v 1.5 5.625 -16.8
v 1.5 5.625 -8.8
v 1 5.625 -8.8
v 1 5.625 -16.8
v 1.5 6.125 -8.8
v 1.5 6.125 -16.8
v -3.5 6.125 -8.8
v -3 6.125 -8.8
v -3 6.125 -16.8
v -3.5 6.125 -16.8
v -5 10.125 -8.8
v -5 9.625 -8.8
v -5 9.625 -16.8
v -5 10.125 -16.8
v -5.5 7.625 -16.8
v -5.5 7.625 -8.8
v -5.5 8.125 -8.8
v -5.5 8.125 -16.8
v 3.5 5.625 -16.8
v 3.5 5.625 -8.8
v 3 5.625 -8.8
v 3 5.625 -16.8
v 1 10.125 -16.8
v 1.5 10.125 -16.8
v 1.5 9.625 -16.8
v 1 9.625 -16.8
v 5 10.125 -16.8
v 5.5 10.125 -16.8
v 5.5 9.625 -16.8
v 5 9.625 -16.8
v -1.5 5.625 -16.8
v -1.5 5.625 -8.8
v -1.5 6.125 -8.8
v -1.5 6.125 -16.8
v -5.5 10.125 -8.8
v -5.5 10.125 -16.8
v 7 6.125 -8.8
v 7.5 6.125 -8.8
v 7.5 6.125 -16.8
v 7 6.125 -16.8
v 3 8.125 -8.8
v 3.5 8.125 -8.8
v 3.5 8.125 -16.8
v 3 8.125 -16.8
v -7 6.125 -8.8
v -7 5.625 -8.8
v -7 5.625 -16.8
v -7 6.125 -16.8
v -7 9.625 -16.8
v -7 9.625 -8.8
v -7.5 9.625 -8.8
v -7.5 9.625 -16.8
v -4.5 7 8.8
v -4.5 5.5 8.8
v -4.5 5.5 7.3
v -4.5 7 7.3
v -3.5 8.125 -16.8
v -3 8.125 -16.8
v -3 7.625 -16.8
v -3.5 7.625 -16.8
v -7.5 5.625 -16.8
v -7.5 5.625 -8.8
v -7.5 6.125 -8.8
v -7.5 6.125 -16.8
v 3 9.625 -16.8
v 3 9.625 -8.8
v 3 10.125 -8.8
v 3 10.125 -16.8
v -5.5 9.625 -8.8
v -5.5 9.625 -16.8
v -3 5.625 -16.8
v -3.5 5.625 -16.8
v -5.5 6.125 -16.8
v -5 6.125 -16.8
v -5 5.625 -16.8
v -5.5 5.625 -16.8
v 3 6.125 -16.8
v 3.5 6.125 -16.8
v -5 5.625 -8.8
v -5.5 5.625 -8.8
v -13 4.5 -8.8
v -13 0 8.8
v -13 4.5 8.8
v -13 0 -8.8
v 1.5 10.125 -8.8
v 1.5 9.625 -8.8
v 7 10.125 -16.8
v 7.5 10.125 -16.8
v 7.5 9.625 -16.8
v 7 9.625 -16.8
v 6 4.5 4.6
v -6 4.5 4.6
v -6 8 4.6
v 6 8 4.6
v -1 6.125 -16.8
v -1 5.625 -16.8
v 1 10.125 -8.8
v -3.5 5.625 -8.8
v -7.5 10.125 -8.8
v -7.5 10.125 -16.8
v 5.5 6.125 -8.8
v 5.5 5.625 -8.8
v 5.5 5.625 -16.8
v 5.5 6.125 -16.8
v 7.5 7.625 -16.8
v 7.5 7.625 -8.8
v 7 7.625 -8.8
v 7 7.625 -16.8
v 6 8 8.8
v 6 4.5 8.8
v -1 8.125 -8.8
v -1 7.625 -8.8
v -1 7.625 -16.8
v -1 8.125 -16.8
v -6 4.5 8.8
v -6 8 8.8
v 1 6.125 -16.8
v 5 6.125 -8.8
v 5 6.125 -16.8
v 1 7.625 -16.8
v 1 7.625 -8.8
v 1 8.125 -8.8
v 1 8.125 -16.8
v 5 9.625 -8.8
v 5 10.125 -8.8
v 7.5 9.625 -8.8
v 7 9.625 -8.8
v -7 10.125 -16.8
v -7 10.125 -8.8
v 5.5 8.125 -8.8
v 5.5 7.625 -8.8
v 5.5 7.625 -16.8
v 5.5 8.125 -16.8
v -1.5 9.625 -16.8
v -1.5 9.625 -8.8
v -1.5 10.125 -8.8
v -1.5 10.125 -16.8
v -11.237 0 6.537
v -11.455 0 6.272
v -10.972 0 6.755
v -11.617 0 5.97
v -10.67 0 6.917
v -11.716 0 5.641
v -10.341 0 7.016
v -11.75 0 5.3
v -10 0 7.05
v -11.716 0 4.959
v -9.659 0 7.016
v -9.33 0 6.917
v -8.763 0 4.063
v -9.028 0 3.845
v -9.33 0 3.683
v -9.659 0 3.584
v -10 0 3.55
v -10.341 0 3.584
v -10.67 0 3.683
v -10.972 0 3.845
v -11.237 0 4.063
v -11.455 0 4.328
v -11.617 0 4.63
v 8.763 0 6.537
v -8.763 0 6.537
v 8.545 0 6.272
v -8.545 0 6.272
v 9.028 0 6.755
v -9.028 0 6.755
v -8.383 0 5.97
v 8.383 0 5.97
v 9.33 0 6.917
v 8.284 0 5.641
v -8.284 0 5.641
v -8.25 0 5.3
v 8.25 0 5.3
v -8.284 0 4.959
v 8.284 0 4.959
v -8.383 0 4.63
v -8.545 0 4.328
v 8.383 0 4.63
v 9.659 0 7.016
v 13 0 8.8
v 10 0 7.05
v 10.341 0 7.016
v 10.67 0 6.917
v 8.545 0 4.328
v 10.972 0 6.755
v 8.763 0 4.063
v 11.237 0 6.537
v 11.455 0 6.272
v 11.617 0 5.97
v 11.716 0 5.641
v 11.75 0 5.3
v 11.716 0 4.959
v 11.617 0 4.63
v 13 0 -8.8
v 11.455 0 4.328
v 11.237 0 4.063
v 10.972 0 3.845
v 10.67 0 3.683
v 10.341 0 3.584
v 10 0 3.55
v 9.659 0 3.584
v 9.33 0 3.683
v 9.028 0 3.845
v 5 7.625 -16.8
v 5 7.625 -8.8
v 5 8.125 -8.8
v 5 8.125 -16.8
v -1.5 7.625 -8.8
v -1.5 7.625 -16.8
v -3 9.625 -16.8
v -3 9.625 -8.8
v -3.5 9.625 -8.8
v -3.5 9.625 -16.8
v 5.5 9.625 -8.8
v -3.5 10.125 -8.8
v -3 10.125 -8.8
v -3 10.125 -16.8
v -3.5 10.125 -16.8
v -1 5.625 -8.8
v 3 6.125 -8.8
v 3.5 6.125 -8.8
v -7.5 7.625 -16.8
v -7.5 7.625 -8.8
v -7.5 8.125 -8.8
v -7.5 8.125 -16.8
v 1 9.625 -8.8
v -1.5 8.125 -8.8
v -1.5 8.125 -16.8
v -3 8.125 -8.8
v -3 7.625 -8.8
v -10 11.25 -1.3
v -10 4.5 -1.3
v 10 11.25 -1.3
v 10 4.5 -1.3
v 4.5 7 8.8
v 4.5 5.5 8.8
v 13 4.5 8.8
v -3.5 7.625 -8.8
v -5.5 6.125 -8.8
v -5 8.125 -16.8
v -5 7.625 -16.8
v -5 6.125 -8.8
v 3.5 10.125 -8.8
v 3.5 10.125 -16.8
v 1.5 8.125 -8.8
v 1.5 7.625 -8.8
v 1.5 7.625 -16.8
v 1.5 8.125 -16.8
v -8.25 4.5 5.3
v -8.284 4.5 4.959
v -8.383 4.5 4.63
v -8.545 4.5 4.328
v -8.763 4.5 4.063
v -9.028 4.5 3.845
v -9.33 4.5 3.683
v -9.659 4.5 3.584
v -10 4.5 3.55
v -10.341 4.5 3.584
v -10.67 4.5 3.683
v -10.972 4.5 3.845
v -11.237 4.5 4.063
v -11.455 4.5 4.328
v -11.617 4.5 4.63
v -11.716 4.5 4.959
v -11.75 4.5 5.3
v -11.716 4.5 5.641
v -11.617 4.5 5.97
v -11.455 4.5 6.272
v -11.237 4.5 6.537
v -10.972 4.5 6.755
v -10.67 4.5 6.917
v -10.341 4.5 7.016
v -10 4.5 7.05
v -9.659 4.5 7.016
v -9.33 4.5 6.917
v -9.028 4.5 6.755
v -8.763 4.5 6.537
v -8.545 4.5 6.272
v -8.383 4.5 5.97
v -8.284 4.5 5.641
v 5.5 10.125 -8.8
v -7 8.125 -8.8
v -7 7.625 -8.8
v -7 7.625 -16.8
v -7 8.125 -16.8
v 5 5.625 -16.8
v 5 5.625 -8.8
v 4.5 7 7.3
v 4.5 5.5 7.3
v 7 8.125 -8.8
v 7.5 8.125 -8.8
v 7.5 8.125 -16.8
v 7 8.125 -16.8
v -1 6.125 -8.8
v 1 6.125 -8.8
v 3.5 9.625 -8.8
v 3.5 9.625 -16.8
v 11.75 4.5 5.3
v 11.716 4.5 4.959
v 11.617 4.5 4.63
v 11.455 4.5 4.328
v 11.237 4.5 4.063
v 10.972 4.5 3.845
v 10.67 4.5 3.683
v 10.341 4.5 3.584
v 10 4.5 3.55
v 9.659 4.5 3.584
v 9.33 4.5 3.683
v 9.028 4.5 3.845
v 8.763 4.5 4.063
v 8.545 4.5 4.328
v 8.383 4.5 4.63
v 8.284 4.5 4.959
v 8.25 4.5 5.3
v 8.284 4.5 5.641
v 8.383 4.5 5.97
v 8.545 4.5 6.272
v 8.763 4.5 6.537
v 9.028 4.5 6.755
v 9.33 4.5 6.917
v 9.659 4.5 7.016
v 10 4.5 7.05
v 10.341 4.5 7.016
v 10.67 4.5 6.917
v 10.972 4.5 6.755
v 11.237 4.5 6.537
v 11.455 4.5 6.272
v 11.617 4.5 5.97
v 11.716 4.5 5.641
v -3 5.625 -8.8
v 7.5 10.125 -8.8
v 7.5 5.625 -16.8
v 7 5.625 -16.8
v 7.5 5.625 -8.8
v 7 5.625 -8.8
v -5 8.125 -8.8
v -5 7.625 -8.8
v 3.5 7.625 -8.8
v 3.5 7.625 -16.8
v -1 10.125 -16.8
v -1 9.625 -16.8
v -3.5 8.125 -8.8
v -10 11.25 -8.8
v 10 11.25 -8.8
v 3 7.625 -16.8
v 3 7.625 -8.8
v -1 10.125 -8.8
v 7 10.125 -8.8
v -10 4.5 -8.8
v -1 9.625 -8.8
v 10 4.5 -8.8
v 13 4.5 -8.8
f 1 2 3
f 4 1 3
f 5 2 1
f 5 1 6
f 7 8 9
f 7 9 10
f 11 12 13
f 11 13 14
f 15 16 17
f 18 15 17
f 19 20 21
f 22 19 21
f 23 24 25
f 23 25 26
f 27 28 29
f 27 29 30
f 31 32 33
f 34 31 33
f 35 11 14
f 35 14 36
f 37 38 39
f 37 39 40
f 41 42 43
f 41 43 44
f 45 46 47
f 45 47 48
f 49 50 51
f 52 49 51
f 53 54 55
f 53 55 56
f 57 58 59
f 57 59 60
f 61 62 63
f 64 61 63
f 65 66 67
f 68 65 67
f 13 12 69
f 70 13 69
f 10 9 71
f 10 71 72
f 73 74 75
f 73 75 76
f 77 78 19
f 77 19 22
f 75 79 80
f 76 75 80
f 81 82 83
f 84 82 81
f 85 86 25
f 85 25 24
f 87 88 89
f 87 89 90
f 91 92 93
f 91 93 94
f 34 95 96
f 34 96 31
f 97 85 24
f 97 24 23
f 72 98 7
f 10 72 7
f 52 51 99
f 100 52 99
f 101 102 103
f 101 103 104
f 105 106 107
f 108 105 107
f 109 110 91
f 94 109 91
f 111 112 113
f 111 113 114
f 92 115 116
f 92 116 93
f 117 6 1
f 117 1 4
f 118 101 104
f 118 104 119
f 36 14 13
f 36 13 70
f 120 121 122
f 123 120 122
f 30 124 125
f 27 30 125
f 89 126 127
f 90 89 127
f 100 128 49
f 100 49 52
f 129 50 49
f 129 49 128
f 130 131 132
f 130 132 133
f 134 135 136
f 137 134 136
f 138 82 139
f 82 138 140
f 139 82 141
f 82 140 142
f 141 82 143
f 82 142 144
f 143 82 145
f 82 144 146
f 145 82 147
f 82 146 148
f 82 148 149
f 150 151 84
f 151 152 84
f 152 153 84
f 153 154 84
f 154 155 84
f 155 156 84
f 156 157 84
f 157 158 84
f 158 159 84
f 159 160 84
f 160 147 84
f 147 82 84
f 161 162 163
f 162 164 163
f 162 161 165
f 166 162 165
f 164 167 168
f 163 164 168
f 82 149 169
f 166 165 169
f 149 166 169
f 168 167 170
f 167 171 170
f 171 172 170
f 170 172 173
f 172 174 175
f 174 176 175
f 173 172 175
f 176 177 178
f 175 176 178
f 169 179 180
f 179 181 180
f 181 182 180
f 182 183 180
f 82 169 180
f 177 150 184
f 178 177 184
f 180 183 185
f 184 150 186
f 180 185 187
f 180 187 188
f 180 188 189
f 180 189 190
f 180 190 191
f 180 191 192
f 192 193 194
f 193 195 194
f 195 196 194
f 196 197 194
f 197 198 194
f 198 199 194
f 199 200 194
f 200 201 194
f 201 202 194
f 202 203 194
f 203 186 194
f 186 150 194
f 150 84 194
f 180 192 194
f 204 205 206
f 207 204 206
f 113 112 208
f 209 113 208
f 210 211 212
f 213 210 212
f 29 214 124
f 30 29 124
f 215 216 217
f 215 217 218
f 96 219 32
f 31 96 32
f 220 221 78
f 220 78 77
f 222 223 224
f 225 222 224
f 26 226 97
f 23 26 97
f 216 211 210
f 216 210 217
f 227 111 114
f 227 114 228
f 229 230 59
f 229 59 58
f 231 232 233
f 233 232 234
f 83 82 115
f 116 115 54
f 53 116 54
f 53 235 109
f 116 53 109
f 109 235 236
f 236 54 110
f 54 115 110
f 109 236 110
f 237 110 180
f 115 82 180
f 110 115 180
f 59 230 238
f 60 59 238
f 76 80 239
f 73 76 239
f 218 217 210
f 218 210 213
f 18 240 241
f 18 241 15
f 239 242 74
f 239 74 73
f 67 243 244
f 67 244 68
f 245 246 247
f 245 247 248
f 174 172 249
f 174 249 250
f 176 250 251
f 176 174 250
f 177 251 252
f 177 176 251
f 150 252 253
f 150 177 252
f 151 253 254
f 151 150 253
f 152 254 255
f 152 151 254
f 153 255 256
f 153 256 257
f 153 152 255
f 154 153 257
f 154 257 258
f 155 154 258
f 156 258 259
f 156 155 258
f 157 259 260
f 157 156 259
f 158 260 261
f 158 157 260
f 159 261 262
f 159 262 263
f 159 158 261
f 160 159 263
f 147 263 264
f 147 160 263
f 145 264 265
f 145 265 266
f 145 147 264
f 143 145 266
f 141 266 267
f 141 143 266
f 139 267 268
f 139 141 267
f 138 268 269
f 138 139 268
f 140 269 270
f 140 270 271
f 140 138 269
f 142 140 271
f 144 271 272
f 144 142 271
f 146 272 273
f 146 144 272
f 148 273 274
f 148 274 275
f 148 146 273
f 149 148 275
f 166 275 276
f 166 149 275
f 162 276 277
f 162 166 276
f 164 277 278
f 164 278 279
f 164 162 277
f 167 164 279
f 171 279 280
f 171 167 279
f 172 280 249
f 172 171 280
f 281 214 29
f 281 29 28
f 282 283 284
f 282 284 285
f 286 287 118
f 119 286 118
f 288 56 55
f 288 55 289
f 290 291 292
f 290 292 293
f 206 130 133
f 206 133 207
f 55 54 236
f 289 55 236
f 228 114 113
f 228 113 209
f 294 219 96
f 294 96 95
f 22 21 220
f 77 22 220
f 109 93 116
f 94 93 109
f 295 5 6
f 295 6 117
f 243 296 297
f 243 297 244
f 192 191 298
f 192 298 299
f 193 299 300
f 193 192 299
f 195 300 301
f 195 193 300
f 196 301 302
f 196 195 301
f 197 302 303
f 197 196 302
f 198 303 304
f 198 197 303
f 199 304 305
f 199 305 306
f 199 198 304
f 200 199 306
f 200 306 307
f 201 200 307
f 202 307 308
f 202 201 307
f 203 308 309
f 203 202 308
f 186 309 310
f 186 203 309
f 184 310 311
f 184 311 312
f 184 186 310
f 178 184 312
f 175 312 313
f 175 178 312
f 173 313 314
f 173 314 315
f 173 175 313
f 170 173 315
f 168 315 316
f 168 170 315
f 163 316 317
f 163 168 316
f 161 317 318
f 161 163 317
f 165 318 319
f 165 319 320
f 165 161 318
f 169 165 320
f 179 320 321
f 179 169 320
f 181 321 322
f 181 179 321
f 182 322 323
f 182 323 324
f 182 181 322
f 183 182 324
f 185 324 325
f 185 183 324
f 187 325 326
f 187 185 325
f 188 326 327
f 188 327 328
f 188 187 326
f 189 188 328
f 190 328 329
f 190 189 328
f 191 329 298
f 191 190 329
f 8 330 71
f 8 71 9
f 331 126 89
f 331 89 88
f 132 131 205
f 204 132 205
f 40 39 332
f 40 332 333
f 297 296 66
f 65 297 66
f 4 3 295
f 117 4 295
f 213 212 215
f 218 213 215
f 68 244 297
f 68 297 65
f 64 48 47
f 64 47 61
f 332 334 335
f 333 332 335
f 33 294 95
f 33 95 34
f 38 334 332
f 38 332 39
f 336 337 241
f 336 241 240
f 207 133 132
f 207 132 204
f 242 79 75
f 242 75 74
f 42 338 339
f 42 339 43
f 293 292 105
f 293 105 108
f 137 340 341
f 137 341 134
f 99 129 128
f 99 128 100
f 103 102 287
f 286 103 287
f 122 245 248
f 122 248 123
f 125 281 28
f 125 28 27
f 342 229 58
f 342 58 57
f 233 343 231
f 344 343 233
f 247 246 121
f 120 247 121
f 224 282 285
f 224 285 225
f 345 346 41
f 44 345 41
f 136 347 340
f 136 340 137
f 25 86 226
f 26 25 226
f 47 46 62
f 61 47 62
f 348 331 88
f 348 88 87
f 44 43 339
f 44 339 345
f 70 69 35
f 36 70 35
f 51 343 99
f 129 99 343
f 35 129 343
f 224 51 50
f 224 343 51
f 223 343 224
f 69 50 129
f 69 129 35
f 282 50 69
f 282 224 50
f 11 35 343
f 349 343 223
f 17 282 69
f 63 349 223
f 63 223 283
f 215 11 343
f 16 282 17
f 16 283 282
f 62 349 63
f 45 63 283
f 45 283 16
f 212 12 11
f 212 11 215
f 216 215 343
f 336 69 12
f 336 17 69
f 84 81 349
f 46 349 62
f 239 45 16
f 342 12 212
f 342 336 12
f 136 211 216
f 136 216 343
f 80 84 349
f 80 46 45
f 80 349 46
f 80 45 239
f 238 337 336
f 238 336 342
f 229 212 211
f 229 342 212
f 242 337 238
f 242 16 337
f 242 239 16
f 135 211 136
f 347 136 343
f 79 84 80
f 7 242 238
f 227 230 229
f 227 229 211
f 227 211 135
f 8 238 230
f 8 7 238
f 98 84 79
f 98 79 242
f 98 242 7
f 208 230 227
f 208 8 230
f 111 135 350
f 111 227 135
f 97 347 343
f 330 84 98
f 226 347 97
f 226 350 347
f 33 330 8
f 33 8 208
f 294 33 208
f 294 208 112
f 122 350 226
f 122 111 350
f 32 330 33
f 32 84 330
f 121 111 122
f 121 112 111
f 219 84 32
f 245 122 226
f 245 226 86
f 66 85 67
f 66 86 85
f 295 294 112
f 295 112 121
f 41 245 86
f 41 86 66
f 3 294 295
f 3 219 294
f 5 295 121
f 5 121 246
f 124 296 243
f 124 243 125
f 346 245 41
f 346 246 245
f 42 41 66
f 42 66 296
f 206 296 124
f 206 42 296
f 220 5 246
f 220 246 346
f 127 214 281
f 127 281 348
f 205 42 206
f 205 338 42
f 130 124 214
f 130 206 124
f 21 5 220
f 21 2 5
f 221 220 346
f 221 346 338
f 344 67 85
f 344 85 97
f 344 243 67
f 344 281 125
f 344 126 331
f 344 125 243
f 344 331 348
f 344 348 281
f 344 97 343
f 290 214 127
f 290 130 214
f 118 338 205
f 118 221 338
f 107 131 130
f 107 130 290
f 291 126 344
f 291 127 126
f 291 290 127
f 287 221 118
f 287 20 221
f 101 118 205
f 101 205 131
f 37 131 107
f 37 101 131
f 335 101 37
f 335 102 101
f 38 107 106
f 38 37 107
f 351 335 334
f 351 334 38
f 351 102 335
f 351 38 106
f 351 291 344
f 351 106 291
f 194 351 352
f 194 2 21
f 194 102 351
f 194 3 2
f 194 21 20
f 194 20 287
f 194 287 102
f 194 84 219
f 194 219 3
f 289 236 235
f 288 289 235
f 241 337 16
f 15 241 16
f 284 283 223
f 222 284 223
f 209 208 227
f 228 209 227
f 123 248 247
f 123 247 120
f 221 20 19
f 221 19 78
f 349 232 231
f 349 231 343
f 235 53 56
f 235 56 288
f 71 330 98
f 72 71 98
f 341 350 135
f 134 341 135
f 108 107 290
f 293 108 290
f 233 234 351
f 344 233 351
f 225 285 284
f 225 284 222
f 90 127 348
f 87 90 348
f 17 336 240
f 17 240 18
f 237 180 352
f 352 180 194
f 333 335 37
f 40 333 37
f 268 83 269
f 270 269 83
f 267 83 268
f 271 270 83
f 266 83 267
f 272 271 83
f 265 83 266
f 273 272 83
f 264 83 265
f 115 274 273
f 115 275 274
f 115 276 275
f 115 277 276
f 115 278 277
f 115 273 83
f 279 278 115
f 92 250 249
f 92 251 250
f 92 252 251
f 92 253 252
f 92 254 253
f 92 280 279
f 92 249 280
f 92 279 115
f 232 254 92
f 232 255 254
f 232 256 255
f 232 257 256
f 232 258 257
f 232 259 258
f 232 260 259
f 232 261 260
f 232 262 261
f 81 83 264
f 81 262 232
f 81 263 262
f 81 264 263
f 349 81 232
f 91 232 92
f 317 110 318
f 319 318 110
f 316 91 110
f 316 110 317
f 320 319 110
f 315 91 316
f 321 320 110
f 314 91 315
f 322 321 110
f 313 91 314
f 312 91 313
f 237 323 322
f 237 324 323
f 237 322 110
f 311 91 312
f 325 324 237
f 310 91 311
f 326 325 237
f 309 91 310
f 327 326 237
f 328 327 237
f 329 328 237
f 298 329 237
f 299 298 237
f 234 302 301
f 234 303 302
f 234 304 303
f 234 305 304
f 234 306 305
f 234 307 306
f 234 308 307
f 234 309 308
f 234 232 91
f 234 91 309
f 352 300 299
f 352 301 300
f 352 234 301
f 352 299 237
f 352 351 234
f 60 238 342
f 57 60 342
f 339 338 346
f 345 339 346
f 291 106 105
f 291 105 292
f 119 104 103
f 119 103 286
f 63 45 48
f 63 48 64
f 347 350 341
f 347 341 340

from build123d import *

# Parameters (mm, degrees)
SKETCH1_W           = 26
SKETCH1_H           = 17.6
SKETCH1_R           = 1.75
BOSS_EXTRUDE1_DEPTH = 4.5
SKETCH2_W           = 12
SKETCH2_H           = 4.2
BOSS_EXTRUDE2_DEPTH = 3.5
SKETCH3_W           = 9
SKETCH3_H           = 1.5
CUT_EXTRUDE1_DEPTH  = 1.5
SKETCH4_W           = 20
SKETCH4_H           = 7.5
BOSS_EXTRUDE3_DEPTH = 6.75
SKETCH5_W           = 0.5
SKETCH5_H           = 0.5
BOSS_EXTRUDE4_DEPTH = 8


with BuildPart() as part:
    # Sketch1 → Boss-Extrude1 (new body)
    with BuildSketch(Plane(origin=(0, 0, 0), x_dir=(1, 0, 0), z_dir=(0, 1, 0))):
        Rectangle(SKETCH1_W, SKETCH1_H)
        with Locations((10, -5.3)):
            Circle(SKETCH1_R, mode=Mode.SUBTRACT)
        with Locations((-10, -5.3)):
            Circle(SKETCH1_R, mode=Mode.SUBTRACT)
    extrude(amount=BOSS_EXTRUDE1_DEPTH)

    # Sketch2 → Boss-Extrude2 (add)
    with BuildSketch(Plane(origin=(0, 4.5, 0), x_dir=(1, 0, 0), z_dir=(0, 1, 0))):
        with Locations((0, -6.7)):
            Rectangle(SKETCH2_W, SKETCH2_H)
    extrude(amount=BOSS_EXTRUDE2_DEPTH)

    # Sketch3 → Cut-Extrude1 (cut)
    with BuildSketch(Plane.XY.offset(8.8)):
        with Locations((0, 6.25)):
            Rectangle(SKETCH3_W, SKETCH3_H)
    extrude(amount=-CUT_EXTRUDE1_DEPTH, mode=Mode.SUBTRACT)

    # Sketch4 → Boss-Extrude3 (add)
    with BuildSketch(Plane(origin=(0, 4.5, 0), x_dir=(1, 0, 0), z_dir=(0, 1, 0))):
        with Locations((0, 5.05)):
            Rectangle(SKETCH4_W, SKETCH4_H)
    extrude(amount=BOSS_EXTRUDE3_DEPTH)

    # Sketch5 → Boss-Extrude4 (add)
    with BuildSketch(Plane(origin=(0, 0, -8.8), x_dir=(-1, 0, 0), z_dir=(0, 0, -1))):
        with Locations((3.25, 7.875)):
            Rectangle(SKETCH5_W, SKETCH5_H)
        with Locations((1.25, 7.875)):
            Rectangle(SKETCH5_W, SKETCH5_H)
        with Locations((5.25, 7.875)):
            Rectangle(SKETCH5_W, SKETCH5_H)
        with Locations((7.25, 7.875)):
            Rectangle(SKETCH5_W, SKETCH5_H)
        with Locations((-7.25, 7.875)):
            Rectangle(SKETCH5_W, SKETCH5_H)
        with Locations((-5.25, 7.875)):
            Rectangle(SKETCH5_W, SKETCH5_H)
        with Locations((-3.25, 7.875)):
            Rectangle(SKETCH5_W, SKETCH5_H)
        with Locations((-1.25, 7.875)):
            Rectangle(SKETCH5_W, SKETCH5_H)
        with Locations((-3.25, 9.875)):
            Rectangle(SKETCH5_W, SKETCH5_H)
        with Locations((-1.25, 9.875)):
            Rectangle(SKETCH5_W, SKETCH5_H)
        with Locations((-5.25, 9.875)):
            Rectangle(SKETCH5_W, SKETCH5_H)
        with Locations((-7.25, 9.875)):
            Rectangle(SKETCH5_W, SKETCH5_H)
        with Locations((7.25, 9.875)):
            Rectangle(SKETCH5_W, SKETCH5_H)
        with Locations((5.25, 9.875)):
            Rectangle(SKETCH5_W, SKETCH5_H)
        with Locations((3.25, 9.875)):
            Rectangle(SKETCH5_W, SKETCH5_H)
        with Locations((1.25, 9.875)):
            Rectangle(SKETCH5_W, SKETCH5_H)
        with Locations((-3.25, 5.875)):
            Rectangle(SKETCH5_W, SKETCH5_H)
        with Locations((-1.25, 5.875)):
            Rectangle(SKETCH5_W, SKETCH5_H)
        with Locations((-5.25, 5.875)):
            Rectangle(SKETCH5_W, SKETCH5_H)
        with Locations((-7.25, 5.875)):
            Rectangle(SKETCH5_W, SKETCH5_H)
        with Locations((7.25, 5.875)):
            Rectangle(SKETCH5_W, SKETCH5_H)
        with Locations((5.25, 5.875)):
            Rectangle(SKETCH5_W, SKETCH5_H)
        with Locations((3.25, 5.875)):
            Rectangle(SKETCH5_W, SKETCH5_H)
        with Locations((1.25, 5.875)):
            Rectangle(SKETCH5_W, SKETCH5_H)
    extrude(amount=BOSS_EXTRUDE4_DEPTH)


solid = part.part
